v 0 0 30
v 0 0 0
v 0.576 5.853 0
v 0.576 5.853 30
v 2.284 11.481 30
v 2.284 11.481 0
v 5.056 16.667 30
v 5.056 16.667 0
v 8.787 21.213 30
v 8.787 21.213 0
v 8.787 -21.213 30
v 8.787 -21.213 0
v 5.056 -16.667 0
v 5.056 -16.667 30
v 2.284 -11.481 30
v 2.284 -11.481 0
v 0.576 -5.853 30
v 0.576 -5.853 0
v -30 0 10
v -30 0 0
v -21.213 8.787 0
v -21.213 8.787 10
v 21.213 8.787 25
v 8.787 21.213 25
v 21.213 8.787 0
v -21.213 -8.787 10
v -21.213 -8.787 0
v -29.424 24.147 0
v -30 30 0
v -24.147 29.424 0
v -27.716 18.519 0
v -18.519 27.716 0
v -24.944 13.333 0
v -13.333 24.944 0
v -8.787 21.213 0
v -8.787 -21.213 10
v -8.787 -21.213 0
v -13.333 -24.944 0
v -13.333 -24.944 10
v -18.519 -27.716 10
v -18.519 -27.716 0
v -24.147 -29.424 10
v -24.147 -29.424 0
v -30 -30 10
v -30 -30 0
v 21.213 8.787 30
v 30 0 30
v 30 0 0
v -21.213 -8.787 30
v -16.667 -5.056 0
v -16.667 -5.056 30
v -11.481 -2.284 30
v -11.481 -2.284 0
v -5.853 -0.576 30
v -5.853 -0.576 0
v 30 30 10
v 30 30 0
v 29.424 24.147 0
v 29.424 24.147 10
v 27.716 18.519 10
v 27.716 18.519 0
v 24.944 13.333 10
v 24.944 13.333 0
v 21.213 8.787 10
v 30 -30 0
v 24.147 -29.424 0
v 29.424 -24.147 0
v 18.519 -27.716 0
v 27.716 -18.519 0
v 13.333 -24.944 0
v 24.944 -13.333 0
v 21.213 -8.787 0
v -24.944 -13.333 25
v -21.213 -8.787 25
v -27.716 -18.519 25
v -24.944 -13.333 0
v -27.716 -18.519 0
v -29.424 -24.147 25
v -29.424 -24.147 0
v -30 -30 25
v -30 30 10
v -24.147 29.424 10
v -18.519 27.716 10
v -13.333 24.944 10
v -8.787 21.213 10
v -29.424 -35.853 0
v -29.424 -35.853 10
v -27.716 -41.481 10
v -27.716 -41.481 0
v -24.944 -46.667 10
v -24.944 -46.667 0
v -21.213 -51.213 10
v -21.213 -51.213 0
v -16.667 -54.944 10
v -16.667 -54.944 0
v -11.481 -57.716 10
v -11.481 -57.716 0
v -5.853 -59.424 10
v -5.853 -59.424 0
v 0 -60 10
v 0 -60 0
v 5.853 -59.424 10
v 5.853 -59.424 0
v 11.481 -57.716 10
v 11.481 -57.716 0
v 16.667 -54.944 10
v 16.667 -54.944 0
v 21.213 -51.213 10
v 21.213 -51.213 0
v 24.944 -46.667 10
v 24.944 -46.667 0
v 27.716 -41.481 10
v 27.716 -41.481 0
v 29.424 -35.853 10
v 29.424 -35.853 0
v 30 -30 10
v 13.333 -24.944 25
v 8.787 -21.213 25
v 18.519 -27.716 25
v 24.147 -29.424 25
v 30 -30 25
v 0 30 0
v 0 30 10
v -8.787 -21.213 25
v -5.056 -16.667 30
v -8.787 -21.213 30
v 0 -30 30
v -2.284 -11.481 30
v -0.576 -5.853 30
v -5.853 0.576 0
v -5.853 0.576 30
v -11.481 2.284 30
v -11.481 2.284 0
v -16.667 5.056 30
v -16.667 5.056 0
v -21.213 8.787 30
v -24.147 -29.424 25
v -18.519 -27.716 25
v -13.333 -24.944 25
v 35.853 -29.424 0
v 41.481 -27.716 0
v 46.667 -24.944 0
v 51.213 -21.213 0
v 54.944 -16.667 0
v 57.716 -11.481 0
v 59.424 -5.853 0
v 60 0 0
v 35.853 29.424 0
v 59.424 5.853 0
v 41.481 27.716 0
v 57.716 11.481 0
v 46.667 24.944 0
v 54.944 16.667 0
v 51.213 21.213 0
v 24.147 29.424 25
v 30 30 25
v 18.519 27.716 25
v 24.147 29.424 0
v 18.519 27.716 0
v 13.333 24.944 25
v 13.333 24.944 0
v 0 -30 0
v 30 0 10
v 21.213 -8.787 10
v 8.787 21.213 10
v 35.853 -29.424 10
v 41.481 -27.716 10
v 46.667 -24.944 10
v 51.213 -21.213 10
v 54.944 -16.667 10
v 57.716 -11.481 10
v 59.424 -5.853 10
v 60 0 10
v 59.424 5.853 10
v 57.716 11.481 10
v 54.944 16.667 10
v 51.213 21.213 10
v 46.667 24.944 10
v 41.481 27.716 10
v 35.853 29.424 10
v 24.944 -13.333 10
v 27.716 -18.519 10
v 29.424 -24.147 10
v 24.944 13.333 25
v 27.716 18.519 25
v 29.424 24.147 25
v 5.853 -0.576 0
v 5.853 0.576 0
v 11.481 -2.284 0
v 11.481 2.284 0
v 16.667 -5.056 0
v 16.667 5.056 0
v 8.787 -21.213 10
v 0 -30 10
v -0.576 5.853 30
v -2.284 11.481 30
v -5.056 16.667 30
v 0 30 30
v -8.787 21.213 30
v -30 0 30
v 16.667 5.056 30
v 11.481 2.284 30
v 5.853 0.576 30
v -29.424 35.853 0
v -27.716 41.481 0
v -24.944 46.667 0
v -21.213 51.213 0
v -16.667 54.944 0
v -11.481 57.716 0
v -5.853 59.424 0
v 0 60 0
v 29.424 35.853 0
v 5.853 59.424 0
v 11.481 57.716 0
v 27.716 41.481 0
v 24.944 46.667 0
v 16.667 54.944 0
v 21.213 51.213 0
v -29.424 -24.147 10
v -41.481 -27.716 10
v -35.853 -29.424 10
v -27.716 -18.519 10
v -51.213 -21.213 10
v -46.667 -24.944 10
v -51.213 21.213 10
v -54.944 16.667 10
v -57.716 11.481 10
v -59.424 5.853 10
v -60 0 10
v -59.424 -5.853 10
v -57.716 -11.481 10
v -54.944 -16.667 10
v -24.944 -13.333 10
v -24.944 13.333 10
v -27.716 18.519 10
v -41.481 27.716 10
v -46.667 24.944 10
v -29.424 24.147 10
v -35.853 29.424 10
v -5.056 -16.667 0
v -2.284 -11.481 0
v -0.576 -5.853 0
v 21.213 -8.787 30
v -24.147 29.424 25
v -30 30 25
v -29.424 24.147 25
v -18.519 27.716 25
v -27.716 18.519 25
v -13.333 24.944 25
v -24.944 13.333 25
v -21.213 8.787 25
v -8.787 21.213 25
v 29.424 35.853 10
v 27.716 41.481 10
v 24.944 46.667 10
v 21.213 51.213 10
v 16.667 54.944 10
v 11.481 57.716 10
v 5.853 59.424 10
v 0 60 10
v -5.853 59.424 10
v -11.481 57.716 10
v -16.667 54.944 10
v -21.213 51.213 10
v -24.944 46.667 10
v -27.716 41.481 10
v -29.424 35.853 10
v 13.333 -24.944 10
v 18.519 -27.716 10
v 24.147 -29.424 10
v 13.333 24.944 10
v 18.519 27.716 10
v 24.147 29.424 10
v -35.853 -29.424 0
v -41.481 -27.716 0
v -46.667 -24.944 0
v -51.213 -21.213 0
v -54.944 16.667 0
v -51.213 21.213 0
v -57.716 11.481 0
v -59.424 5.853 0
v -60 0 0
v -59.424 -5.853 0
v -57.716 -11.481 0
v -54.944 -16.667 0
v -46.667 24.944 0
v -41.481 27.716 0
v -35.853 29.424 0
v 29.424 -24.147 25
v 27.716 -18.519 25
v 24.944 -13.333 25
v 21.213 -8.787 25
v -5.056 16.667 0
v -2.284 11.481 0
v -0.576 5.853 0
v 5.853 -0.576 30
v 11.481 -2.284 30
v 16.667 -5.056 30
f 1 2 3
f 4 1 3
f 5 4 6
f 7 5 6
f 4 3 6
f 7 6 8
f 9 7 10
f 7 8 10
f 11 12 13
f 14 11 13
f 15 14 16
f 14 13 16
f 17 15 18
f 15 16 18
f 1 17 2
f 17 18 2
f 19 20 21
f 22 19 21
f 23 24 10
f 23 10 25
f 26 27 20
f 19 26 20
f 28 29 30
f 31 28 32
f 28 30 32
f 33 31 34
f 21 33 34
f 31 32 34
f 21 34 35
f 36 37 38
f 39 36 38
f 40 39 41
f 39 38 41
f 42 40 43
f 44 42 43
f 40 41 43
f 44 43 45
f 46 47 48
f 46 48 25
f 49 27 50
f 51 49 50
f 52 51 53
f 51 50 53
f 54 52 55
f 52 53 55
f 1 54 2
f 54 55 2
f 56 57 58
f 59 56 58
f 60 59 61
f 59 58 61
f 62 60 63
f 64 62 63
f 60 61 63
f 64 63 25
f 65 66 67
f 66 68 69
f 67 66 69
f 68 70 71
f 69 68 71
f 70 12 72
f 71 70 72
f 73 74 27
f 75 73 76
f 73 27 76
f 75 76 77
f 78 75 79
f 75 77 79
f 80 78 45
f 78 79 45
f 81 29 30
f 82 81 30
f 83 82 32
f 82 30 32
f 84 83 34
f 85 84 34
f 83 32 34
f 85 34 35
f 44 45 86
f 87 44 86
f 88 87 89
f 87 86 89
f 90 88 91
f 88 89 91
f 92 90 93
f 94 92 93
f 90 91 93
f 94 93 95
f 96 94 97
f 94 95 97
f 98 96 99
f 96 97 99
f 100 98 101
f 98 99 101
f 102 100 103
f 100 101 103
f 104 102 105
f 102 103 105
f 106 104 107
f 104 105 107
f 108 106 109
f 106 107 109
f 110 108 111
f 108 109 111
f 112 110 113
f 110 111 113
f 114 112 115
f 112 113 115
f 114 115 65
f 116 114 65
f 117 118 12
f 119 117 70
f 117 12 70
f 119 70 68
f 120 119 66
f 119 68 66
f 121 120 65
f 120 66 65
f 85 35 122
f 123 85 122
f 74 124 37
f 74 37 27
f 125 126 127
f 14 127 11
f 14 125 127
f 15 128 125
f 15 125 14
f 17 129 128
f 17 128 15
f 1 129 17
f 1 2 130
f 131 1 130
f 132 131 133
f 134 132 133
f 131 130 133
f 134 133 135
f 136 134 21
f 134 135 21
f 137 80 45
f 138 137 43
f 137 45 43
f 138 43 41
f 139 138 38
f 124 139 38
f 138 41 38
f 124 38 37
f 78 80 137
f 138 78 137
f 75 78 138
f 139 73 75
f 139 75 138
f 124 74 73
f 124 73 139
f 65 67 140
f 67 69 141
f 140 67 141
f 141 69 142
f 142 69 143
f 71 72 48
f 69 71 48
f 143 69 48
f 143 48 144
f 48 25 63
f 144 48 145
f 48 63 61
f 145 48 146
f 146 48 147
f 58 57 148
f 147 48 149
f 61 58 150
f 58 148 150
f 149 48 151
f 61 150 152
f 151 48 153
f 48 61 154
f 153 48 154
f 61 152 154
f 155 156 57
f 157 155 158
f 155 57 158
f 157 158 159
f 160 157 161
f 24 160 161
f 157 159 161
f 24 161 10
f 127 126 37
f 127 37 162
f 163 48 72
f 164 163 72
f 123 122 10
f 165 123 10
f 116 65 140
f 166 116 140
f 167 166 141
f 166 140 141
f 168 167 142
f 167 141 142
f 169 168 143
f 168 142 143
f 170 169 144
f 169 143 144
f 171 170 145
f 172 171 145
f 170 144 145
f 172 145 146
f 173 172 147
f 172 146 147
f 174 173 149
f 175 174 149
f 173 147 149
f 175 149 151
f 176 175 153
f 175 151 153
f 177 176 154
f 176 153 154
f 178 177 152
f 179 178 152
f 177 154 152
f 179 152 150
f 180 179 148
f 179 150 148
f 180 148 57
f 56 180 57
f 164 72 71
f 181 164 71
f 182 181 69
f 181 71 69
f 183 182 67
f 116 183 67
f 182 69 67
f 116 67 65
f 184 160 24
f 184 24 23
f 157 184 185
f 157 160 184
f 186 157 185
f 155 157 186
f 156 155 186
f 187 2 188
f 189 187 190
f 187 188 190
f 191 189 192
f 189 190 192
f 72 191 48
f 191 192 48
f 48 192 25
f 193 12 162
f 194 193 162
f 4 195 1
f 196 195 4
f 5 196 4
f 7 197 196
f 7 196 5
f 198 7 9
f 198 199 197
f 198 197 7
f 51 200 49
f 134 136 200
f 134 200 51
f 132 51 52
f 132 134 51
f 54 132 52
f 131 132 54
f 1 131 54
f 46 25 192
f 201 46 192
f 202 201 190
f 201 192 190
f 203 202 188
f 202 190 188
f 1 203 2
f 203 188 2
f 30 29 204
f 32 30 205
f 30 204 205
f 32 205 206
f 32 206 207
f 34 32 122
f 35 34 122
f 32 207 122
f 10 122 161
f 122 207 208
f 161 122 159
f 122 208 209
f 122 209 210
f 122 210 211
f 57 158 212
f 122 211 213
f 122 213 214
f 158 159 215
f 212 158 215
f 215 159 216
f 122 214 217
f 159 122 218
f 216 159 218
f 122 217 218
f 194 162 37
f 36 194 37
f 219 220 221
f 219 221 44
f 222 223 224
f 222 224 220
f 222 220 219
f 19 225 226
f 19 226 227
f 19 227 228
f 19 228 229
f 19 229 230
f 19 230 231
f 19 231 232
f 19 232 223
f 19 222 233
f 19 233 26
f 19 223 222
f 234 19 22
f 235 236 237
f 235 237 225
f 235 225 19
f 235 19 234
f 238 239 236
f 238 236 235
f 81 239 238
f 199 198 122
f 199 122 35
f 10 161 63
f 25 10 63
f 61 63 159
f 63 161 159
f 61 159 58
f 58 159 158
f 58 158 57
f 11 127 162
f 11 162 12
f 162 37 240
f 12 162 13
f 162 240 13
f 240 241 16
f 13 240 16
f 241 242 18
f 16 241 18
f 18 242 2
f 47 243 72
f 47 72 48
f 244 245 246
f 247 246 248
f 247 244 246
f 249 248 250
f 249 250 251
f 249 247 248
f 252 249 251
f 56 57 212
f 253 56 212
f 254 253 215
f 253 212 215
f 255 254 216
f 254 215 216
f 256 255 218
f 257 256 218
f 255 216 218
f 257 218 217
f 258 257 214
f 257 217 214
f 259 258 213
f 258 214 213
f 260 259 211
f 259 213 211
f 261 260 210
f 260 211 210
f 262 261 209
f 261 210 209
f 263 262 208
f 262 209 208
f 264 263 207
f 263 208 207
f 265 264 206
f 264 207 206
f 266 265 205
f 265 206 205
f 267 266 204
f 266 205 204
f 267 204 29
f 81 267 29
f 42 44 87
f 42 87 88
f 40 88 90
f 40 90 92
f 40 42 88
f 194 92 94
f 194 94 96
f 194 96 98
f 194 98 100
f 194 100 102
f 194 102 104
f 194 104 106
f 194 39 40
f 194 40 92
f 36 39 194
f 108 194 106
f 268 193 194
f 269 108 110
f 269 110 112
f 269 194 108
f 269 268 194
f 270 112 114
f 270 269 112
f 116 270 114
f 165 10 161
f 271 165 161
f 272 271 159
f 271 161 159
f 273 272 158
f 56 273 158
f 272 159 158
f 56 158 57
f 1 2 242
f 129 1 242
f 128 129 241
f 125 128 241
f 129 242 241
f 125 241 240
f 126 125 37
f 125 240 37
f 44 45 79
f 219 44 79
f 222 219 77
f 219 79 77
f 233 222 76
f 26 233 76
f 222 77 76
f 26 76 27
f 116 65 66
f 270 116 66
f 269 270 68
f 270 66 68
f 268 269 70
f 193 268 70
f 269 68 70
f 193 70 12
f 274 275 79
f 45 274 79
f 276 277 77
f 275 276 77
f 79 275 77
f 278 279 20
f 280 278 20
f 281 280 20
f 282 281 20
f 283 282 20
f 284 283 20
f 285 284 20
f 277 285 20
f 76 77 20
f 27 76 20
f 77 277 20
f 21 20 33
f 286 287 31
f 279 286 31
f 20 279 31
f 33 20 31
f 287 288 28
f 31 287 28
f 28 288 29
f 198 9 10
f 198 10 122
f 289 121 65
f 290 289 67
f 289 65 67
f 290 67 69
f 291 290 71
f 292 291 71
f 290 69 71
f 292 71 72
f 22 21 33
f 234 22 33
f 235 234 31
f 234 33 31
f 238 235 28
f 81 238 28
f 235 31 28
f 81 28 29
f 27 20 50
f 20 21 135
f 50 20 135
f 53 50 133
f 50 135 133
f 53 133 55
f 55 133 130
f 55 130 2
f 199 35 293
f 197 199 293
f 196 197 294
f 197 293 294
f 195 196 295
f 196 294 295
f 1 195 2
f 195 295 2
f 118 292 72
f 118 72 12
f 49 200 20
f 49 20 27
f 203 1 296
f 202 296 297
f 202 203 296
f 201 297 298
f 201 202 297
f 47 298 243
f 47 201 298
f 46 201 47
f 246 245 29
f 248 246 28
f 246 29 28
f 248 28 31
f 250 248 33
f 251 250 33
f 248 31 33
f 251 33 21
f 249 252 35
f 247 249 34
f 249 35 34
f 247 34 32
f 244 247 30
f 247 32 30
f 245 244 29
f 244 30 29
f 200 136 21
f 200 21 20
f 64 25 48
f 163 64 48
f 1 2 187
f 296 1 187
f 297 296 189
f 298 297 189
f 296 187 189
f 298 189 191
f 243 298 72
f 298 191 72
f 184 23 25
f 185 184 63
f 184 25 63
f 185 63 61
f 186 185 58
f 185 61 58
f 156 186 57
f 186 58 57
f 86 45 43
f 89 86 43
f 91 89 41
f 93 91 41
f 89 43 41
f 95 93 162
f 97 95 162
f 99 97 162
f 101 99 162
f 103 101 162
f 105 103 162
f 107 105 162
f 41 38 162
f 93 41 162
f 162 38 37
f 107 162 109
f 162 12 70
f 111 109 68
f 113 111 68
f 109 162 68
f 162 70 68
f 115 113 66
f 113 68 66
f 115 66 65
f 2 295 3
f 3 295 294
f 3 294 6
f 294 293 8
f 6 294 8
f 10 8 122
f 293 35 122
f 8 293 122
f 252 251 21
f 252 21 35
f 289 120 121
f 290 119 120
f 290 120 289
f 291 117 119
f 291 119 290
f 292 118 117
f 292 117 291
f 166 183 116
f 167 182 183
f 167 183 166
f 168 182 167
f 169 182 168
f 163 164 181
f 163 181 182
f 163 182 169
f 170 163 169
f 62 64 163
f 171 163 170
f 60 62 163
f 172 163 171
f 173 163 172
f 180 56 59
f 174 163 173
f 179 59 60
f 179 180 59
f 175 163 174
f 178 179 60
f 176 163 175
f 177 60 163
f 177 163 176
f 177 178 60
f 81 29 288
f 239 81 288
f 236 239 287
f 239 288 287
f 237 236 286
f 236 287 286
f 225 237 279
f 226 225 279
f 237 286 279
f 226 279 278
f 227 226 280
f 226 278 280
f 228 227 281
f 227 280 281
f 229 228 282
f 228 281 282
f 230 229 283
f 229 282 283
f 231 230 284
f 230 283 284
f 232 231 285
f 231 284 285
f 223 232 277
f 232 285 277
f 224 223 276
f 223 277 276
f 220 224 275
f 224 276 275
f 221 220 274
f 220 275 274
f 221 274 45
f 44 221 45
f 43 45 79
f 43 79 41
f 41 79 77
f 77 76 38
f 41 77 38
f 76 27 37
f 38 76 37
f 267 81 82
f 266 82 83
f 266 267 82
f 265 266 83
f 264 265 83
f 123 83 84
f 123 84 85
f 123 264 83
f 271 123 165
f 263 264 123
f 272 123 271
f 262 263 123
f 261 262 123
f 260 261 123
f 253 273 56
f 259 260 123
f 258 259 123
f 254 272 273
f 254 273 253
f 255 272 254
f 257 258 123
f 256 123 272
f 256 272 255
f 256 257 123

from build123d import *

# Parameters (mm, degrees)
F1_DEPTH = 25
F2_DEPTH = 10
F3_DEPTH = 30


with BuildPart() as f1:
    # F0 (on Top) → F1 (new body)
    with BuildSketch(Plane.XY):
        with BuildLine():
            ThreePointArc((21.2132034356, 8.7867965644), (27.7163859753, 18.519497029), (30, 30))
            ThreePointArc((30, 30), (18.519497029, 27.7163859753), (8.7867965644, 21.2132034356))
            Line((8.7867965644, 21.2132034356), (21.2132034356, 8.7867965644))
        make_face()
    extrude(amount=F1_DEPTH)


with BuildPart() as f1b:
    # F0 (on Top) → F1, piece 2 (new body)
    with BuildSketch(Plane.XY):
        with BuildLine():
            ThreePointArc((8.7867965644, -21.2132034356), (18.519497029, -27.7163859753), (30, -30))
            ThreePointArc((30, -30), (27.7163859753, -18.519497029), (21.2132034356, -8.7867965644))
            Line((21.2132034356, -8.7867965644), (8.7867965644, -21.2132034356))
        make_face()
    extrude(amount=F1_DEPTH)


with BuildPart() as f1c:
    # F0 (on Top) → F1, piece 3 (new body)
    with BuildSketch(Plane.XY):
        with BuildLine():
            ThreePointArc((-8.7867965644, 21.2132034356), (-18.519497029, 27.7163859753), (-30, 30))
            ThreePointArc((-30, 30), (-27.7163859753, 18.519497029), (-21.2132034356, 8.7867965644))
            Line((-21.2132034356, 8.7867965644), (-8.7867965644, 21.2132034356))
        make_face()
    extrude(amount=F1_DEPTH)


with BuildPart() as f1d:
    # F0 (on Top) → F1, piece 4 (new body)
    with BuildSketch(Plane.XY):
        with BuildLine():
            ThreePointArc((-21.2132034356, -8.7867965644), (-27.7163859753, -18.519497029), (-30, -30))
            ThreePointArc((-30, -30), (-18.519497029, -27.7163859753), (-8.7867965644, -21.2132034356))
            Line((-8.7867965644, -21.2132034356), (-21.2132034356, -8.7867965644))
        make_face()
    extrude(amount=F1_DEPTH)


with BuildPart() as f2:
    # F0 (on Top) → F2 (new body)
    with BuildSketch(Plane.XY):
        with BuildLine():
            ThreePointArc((30, -30), (51.2132034356, -21.2132034356), (60, 0))
            ThreePointArc((60, 0), (51.2132034356, 21.2132034356), (30, 30))
            ThreePointArc((30, 30), (27.7163859753, 18.519497029), (21.2132034356, 8.7867965644))
            Line((21.2132034356, 8.7867965644), (30, 0))
            Line((30, 0), (21.2132034356, -8.7867965644))
            ThreePointArc((21.2132034356, -8.7867965644), (27.7163859753, -18.519497029), (30, -30))
        make_face()
    extrude(amount=F2_DEPTH)


with BuildPart() as f2b:
    # F0 (on Top) → F2, piece 2 (new body)
    with BuildSketch(Plane.XY):
        with BuildLine():
            ThreePointArc((8.7867965644, 21.2132034356), (18.519497029, 27.7163859753), (30, 30))
            ThreePointArc((30, 30), (0, 60), (-30, 30))
            ThreePointArc((-30, 30), (-18.519497029, 27.7163859753), (-8.7867965644, 21.2132034356))
            Line((-8.7867965644, 21.2132034356), (0, 30))
            Line((0, 30), (8.7867965644, 21.2132034356))
        make_face()
    extrude(amount=F2_DEPTH)


with BuildPart() as f2c:
    # F0 (on Top) → F2, piece 3 (new body)
    with BuildSketch(Plane.XY):
        with BuildLine():
            ThreePointArc((-30, -30), (0, -60), (30, -30))
            ThreePointArc((30, -30), (18.519497029, -27.7163859753), (8.7867965644, -21.2132034356))
            Line((8.7867965644, -21.2132034356), (0, -30))
            Line((0, -30), (-8.7867965644, -21.2132034356))
            ThreePointArc((-8.7867965644, -21.2132034356), (-18.519497029, -27.7163859753), (-30, -30))
        make_face()
    extrude(amount=F2_DEPTH)


with BuildPart() as f2d:
    # F0 (on Top) → F2, piece 4 (new body)
    with BuildSketch(Plane.XY):
        with BuildLine():
            ThreePointArc((-21.2132034356, 8.7867965644), (-27.7163859753, 18.519497029), (-30, 30))
            ThreePointArc((-30, 30), (-60, 0), (-30, -30))
            ThreePointArc((-30, -30), (-27.7163859753, -18.519497029), (-21.2132034356, -8.7867965644))
            Line((-21.2132034356, -8.7867965644), (-30, 0))
            Line((-30, 0), (-21.2132034356, 8.7867965644))
        make_face()
    extrude(amount=F2_DEPTH)


with BuildPart() as f3:
    # F0 (on Top) → F3 (new body)
    with BuildSketch(Plane.XY):
        with BuildLine():
            ThreePointArc((0, 0), (2.2836140247, 11.480502971), (8.7867965644, 21.2132034356))
            Line((8.7867965644, 21.2132034356), (0, 30))
            Line((0, 30), (-8.7867965644, 21.2132034356))
            ThreePointArc((-8.7867965644, 21.2132034356), (-2.2836140247, 11.480502971), (0, 0))
        make_face()
    extrude(amount=F3_DEPTH)


with BuildPart() as f3b:
    # F0 (on Top) → F3, piece 2 (new body)
    with BuildSketch(Plane.XY):
        with BuildLine():
            Line((0, -30), (8.7867965644, -21.2132034356))
            ThreePointArc((8.7867965644, -21.2132034356), (2.2836140247, -11.480502971), (0, 0))
            ThreePointArc((0, 0), (-2.2836140247, -11.480502971), (-8.7867965644, -21.2132034356))
            Line((-8.7867965644, -21.2132034356), (0, -30))
        make_face()
    extrude(amount=F3_DEPTH)


with BuildPart() as f3c:
    # F0 (on Top) → F3, piece 3 (new body)
    with BuildSketch(Plane.XY):
        with BuildLine():
            ThreePointArc((-21.2132034356, -8.7867965644), (-11.480502971, -2.2836140247), (0, 0))
            ThreePointArc((0, 0), (-11.480502971, 2.2836140247), (-21.2132034356, 8.7867965644))
            Line((-21.2132034356, 8.7867965644), (-30, 0))
            Line((-30, 0), (-21.2132034356, -8.7867965644))
        make_face()
    extrude(amount=F3_DEPTH)


with BuildPart() as f3d:
    # F0 (on Top) → F3, piece 4 (new body)
    with BuildSketch(Plane.XY):
        with BuildLine():
            Line((30, 0), (21.2132034356, 8.7867965644))
            ThreePointArc((21.2132034356, 8.7867965644), (11.480502971, 2.2836140247), (0, 0))
            ThreePointArc((0, 0), (11.480502971, -2.2836140247), (21.2132034356, -8.7867965644))
            Line((21.2132034356, -8.7867965644), (30, 0))
        make_face()
    extrude(amount=F3_DEPTH)


solid = Compound([f1.part, f1b.part, f1c.part, f1d.part, f2.part, f2b.part, f2c.part, f2d.part, f3.part, f3b.part, f3c.part, f3d.part])
